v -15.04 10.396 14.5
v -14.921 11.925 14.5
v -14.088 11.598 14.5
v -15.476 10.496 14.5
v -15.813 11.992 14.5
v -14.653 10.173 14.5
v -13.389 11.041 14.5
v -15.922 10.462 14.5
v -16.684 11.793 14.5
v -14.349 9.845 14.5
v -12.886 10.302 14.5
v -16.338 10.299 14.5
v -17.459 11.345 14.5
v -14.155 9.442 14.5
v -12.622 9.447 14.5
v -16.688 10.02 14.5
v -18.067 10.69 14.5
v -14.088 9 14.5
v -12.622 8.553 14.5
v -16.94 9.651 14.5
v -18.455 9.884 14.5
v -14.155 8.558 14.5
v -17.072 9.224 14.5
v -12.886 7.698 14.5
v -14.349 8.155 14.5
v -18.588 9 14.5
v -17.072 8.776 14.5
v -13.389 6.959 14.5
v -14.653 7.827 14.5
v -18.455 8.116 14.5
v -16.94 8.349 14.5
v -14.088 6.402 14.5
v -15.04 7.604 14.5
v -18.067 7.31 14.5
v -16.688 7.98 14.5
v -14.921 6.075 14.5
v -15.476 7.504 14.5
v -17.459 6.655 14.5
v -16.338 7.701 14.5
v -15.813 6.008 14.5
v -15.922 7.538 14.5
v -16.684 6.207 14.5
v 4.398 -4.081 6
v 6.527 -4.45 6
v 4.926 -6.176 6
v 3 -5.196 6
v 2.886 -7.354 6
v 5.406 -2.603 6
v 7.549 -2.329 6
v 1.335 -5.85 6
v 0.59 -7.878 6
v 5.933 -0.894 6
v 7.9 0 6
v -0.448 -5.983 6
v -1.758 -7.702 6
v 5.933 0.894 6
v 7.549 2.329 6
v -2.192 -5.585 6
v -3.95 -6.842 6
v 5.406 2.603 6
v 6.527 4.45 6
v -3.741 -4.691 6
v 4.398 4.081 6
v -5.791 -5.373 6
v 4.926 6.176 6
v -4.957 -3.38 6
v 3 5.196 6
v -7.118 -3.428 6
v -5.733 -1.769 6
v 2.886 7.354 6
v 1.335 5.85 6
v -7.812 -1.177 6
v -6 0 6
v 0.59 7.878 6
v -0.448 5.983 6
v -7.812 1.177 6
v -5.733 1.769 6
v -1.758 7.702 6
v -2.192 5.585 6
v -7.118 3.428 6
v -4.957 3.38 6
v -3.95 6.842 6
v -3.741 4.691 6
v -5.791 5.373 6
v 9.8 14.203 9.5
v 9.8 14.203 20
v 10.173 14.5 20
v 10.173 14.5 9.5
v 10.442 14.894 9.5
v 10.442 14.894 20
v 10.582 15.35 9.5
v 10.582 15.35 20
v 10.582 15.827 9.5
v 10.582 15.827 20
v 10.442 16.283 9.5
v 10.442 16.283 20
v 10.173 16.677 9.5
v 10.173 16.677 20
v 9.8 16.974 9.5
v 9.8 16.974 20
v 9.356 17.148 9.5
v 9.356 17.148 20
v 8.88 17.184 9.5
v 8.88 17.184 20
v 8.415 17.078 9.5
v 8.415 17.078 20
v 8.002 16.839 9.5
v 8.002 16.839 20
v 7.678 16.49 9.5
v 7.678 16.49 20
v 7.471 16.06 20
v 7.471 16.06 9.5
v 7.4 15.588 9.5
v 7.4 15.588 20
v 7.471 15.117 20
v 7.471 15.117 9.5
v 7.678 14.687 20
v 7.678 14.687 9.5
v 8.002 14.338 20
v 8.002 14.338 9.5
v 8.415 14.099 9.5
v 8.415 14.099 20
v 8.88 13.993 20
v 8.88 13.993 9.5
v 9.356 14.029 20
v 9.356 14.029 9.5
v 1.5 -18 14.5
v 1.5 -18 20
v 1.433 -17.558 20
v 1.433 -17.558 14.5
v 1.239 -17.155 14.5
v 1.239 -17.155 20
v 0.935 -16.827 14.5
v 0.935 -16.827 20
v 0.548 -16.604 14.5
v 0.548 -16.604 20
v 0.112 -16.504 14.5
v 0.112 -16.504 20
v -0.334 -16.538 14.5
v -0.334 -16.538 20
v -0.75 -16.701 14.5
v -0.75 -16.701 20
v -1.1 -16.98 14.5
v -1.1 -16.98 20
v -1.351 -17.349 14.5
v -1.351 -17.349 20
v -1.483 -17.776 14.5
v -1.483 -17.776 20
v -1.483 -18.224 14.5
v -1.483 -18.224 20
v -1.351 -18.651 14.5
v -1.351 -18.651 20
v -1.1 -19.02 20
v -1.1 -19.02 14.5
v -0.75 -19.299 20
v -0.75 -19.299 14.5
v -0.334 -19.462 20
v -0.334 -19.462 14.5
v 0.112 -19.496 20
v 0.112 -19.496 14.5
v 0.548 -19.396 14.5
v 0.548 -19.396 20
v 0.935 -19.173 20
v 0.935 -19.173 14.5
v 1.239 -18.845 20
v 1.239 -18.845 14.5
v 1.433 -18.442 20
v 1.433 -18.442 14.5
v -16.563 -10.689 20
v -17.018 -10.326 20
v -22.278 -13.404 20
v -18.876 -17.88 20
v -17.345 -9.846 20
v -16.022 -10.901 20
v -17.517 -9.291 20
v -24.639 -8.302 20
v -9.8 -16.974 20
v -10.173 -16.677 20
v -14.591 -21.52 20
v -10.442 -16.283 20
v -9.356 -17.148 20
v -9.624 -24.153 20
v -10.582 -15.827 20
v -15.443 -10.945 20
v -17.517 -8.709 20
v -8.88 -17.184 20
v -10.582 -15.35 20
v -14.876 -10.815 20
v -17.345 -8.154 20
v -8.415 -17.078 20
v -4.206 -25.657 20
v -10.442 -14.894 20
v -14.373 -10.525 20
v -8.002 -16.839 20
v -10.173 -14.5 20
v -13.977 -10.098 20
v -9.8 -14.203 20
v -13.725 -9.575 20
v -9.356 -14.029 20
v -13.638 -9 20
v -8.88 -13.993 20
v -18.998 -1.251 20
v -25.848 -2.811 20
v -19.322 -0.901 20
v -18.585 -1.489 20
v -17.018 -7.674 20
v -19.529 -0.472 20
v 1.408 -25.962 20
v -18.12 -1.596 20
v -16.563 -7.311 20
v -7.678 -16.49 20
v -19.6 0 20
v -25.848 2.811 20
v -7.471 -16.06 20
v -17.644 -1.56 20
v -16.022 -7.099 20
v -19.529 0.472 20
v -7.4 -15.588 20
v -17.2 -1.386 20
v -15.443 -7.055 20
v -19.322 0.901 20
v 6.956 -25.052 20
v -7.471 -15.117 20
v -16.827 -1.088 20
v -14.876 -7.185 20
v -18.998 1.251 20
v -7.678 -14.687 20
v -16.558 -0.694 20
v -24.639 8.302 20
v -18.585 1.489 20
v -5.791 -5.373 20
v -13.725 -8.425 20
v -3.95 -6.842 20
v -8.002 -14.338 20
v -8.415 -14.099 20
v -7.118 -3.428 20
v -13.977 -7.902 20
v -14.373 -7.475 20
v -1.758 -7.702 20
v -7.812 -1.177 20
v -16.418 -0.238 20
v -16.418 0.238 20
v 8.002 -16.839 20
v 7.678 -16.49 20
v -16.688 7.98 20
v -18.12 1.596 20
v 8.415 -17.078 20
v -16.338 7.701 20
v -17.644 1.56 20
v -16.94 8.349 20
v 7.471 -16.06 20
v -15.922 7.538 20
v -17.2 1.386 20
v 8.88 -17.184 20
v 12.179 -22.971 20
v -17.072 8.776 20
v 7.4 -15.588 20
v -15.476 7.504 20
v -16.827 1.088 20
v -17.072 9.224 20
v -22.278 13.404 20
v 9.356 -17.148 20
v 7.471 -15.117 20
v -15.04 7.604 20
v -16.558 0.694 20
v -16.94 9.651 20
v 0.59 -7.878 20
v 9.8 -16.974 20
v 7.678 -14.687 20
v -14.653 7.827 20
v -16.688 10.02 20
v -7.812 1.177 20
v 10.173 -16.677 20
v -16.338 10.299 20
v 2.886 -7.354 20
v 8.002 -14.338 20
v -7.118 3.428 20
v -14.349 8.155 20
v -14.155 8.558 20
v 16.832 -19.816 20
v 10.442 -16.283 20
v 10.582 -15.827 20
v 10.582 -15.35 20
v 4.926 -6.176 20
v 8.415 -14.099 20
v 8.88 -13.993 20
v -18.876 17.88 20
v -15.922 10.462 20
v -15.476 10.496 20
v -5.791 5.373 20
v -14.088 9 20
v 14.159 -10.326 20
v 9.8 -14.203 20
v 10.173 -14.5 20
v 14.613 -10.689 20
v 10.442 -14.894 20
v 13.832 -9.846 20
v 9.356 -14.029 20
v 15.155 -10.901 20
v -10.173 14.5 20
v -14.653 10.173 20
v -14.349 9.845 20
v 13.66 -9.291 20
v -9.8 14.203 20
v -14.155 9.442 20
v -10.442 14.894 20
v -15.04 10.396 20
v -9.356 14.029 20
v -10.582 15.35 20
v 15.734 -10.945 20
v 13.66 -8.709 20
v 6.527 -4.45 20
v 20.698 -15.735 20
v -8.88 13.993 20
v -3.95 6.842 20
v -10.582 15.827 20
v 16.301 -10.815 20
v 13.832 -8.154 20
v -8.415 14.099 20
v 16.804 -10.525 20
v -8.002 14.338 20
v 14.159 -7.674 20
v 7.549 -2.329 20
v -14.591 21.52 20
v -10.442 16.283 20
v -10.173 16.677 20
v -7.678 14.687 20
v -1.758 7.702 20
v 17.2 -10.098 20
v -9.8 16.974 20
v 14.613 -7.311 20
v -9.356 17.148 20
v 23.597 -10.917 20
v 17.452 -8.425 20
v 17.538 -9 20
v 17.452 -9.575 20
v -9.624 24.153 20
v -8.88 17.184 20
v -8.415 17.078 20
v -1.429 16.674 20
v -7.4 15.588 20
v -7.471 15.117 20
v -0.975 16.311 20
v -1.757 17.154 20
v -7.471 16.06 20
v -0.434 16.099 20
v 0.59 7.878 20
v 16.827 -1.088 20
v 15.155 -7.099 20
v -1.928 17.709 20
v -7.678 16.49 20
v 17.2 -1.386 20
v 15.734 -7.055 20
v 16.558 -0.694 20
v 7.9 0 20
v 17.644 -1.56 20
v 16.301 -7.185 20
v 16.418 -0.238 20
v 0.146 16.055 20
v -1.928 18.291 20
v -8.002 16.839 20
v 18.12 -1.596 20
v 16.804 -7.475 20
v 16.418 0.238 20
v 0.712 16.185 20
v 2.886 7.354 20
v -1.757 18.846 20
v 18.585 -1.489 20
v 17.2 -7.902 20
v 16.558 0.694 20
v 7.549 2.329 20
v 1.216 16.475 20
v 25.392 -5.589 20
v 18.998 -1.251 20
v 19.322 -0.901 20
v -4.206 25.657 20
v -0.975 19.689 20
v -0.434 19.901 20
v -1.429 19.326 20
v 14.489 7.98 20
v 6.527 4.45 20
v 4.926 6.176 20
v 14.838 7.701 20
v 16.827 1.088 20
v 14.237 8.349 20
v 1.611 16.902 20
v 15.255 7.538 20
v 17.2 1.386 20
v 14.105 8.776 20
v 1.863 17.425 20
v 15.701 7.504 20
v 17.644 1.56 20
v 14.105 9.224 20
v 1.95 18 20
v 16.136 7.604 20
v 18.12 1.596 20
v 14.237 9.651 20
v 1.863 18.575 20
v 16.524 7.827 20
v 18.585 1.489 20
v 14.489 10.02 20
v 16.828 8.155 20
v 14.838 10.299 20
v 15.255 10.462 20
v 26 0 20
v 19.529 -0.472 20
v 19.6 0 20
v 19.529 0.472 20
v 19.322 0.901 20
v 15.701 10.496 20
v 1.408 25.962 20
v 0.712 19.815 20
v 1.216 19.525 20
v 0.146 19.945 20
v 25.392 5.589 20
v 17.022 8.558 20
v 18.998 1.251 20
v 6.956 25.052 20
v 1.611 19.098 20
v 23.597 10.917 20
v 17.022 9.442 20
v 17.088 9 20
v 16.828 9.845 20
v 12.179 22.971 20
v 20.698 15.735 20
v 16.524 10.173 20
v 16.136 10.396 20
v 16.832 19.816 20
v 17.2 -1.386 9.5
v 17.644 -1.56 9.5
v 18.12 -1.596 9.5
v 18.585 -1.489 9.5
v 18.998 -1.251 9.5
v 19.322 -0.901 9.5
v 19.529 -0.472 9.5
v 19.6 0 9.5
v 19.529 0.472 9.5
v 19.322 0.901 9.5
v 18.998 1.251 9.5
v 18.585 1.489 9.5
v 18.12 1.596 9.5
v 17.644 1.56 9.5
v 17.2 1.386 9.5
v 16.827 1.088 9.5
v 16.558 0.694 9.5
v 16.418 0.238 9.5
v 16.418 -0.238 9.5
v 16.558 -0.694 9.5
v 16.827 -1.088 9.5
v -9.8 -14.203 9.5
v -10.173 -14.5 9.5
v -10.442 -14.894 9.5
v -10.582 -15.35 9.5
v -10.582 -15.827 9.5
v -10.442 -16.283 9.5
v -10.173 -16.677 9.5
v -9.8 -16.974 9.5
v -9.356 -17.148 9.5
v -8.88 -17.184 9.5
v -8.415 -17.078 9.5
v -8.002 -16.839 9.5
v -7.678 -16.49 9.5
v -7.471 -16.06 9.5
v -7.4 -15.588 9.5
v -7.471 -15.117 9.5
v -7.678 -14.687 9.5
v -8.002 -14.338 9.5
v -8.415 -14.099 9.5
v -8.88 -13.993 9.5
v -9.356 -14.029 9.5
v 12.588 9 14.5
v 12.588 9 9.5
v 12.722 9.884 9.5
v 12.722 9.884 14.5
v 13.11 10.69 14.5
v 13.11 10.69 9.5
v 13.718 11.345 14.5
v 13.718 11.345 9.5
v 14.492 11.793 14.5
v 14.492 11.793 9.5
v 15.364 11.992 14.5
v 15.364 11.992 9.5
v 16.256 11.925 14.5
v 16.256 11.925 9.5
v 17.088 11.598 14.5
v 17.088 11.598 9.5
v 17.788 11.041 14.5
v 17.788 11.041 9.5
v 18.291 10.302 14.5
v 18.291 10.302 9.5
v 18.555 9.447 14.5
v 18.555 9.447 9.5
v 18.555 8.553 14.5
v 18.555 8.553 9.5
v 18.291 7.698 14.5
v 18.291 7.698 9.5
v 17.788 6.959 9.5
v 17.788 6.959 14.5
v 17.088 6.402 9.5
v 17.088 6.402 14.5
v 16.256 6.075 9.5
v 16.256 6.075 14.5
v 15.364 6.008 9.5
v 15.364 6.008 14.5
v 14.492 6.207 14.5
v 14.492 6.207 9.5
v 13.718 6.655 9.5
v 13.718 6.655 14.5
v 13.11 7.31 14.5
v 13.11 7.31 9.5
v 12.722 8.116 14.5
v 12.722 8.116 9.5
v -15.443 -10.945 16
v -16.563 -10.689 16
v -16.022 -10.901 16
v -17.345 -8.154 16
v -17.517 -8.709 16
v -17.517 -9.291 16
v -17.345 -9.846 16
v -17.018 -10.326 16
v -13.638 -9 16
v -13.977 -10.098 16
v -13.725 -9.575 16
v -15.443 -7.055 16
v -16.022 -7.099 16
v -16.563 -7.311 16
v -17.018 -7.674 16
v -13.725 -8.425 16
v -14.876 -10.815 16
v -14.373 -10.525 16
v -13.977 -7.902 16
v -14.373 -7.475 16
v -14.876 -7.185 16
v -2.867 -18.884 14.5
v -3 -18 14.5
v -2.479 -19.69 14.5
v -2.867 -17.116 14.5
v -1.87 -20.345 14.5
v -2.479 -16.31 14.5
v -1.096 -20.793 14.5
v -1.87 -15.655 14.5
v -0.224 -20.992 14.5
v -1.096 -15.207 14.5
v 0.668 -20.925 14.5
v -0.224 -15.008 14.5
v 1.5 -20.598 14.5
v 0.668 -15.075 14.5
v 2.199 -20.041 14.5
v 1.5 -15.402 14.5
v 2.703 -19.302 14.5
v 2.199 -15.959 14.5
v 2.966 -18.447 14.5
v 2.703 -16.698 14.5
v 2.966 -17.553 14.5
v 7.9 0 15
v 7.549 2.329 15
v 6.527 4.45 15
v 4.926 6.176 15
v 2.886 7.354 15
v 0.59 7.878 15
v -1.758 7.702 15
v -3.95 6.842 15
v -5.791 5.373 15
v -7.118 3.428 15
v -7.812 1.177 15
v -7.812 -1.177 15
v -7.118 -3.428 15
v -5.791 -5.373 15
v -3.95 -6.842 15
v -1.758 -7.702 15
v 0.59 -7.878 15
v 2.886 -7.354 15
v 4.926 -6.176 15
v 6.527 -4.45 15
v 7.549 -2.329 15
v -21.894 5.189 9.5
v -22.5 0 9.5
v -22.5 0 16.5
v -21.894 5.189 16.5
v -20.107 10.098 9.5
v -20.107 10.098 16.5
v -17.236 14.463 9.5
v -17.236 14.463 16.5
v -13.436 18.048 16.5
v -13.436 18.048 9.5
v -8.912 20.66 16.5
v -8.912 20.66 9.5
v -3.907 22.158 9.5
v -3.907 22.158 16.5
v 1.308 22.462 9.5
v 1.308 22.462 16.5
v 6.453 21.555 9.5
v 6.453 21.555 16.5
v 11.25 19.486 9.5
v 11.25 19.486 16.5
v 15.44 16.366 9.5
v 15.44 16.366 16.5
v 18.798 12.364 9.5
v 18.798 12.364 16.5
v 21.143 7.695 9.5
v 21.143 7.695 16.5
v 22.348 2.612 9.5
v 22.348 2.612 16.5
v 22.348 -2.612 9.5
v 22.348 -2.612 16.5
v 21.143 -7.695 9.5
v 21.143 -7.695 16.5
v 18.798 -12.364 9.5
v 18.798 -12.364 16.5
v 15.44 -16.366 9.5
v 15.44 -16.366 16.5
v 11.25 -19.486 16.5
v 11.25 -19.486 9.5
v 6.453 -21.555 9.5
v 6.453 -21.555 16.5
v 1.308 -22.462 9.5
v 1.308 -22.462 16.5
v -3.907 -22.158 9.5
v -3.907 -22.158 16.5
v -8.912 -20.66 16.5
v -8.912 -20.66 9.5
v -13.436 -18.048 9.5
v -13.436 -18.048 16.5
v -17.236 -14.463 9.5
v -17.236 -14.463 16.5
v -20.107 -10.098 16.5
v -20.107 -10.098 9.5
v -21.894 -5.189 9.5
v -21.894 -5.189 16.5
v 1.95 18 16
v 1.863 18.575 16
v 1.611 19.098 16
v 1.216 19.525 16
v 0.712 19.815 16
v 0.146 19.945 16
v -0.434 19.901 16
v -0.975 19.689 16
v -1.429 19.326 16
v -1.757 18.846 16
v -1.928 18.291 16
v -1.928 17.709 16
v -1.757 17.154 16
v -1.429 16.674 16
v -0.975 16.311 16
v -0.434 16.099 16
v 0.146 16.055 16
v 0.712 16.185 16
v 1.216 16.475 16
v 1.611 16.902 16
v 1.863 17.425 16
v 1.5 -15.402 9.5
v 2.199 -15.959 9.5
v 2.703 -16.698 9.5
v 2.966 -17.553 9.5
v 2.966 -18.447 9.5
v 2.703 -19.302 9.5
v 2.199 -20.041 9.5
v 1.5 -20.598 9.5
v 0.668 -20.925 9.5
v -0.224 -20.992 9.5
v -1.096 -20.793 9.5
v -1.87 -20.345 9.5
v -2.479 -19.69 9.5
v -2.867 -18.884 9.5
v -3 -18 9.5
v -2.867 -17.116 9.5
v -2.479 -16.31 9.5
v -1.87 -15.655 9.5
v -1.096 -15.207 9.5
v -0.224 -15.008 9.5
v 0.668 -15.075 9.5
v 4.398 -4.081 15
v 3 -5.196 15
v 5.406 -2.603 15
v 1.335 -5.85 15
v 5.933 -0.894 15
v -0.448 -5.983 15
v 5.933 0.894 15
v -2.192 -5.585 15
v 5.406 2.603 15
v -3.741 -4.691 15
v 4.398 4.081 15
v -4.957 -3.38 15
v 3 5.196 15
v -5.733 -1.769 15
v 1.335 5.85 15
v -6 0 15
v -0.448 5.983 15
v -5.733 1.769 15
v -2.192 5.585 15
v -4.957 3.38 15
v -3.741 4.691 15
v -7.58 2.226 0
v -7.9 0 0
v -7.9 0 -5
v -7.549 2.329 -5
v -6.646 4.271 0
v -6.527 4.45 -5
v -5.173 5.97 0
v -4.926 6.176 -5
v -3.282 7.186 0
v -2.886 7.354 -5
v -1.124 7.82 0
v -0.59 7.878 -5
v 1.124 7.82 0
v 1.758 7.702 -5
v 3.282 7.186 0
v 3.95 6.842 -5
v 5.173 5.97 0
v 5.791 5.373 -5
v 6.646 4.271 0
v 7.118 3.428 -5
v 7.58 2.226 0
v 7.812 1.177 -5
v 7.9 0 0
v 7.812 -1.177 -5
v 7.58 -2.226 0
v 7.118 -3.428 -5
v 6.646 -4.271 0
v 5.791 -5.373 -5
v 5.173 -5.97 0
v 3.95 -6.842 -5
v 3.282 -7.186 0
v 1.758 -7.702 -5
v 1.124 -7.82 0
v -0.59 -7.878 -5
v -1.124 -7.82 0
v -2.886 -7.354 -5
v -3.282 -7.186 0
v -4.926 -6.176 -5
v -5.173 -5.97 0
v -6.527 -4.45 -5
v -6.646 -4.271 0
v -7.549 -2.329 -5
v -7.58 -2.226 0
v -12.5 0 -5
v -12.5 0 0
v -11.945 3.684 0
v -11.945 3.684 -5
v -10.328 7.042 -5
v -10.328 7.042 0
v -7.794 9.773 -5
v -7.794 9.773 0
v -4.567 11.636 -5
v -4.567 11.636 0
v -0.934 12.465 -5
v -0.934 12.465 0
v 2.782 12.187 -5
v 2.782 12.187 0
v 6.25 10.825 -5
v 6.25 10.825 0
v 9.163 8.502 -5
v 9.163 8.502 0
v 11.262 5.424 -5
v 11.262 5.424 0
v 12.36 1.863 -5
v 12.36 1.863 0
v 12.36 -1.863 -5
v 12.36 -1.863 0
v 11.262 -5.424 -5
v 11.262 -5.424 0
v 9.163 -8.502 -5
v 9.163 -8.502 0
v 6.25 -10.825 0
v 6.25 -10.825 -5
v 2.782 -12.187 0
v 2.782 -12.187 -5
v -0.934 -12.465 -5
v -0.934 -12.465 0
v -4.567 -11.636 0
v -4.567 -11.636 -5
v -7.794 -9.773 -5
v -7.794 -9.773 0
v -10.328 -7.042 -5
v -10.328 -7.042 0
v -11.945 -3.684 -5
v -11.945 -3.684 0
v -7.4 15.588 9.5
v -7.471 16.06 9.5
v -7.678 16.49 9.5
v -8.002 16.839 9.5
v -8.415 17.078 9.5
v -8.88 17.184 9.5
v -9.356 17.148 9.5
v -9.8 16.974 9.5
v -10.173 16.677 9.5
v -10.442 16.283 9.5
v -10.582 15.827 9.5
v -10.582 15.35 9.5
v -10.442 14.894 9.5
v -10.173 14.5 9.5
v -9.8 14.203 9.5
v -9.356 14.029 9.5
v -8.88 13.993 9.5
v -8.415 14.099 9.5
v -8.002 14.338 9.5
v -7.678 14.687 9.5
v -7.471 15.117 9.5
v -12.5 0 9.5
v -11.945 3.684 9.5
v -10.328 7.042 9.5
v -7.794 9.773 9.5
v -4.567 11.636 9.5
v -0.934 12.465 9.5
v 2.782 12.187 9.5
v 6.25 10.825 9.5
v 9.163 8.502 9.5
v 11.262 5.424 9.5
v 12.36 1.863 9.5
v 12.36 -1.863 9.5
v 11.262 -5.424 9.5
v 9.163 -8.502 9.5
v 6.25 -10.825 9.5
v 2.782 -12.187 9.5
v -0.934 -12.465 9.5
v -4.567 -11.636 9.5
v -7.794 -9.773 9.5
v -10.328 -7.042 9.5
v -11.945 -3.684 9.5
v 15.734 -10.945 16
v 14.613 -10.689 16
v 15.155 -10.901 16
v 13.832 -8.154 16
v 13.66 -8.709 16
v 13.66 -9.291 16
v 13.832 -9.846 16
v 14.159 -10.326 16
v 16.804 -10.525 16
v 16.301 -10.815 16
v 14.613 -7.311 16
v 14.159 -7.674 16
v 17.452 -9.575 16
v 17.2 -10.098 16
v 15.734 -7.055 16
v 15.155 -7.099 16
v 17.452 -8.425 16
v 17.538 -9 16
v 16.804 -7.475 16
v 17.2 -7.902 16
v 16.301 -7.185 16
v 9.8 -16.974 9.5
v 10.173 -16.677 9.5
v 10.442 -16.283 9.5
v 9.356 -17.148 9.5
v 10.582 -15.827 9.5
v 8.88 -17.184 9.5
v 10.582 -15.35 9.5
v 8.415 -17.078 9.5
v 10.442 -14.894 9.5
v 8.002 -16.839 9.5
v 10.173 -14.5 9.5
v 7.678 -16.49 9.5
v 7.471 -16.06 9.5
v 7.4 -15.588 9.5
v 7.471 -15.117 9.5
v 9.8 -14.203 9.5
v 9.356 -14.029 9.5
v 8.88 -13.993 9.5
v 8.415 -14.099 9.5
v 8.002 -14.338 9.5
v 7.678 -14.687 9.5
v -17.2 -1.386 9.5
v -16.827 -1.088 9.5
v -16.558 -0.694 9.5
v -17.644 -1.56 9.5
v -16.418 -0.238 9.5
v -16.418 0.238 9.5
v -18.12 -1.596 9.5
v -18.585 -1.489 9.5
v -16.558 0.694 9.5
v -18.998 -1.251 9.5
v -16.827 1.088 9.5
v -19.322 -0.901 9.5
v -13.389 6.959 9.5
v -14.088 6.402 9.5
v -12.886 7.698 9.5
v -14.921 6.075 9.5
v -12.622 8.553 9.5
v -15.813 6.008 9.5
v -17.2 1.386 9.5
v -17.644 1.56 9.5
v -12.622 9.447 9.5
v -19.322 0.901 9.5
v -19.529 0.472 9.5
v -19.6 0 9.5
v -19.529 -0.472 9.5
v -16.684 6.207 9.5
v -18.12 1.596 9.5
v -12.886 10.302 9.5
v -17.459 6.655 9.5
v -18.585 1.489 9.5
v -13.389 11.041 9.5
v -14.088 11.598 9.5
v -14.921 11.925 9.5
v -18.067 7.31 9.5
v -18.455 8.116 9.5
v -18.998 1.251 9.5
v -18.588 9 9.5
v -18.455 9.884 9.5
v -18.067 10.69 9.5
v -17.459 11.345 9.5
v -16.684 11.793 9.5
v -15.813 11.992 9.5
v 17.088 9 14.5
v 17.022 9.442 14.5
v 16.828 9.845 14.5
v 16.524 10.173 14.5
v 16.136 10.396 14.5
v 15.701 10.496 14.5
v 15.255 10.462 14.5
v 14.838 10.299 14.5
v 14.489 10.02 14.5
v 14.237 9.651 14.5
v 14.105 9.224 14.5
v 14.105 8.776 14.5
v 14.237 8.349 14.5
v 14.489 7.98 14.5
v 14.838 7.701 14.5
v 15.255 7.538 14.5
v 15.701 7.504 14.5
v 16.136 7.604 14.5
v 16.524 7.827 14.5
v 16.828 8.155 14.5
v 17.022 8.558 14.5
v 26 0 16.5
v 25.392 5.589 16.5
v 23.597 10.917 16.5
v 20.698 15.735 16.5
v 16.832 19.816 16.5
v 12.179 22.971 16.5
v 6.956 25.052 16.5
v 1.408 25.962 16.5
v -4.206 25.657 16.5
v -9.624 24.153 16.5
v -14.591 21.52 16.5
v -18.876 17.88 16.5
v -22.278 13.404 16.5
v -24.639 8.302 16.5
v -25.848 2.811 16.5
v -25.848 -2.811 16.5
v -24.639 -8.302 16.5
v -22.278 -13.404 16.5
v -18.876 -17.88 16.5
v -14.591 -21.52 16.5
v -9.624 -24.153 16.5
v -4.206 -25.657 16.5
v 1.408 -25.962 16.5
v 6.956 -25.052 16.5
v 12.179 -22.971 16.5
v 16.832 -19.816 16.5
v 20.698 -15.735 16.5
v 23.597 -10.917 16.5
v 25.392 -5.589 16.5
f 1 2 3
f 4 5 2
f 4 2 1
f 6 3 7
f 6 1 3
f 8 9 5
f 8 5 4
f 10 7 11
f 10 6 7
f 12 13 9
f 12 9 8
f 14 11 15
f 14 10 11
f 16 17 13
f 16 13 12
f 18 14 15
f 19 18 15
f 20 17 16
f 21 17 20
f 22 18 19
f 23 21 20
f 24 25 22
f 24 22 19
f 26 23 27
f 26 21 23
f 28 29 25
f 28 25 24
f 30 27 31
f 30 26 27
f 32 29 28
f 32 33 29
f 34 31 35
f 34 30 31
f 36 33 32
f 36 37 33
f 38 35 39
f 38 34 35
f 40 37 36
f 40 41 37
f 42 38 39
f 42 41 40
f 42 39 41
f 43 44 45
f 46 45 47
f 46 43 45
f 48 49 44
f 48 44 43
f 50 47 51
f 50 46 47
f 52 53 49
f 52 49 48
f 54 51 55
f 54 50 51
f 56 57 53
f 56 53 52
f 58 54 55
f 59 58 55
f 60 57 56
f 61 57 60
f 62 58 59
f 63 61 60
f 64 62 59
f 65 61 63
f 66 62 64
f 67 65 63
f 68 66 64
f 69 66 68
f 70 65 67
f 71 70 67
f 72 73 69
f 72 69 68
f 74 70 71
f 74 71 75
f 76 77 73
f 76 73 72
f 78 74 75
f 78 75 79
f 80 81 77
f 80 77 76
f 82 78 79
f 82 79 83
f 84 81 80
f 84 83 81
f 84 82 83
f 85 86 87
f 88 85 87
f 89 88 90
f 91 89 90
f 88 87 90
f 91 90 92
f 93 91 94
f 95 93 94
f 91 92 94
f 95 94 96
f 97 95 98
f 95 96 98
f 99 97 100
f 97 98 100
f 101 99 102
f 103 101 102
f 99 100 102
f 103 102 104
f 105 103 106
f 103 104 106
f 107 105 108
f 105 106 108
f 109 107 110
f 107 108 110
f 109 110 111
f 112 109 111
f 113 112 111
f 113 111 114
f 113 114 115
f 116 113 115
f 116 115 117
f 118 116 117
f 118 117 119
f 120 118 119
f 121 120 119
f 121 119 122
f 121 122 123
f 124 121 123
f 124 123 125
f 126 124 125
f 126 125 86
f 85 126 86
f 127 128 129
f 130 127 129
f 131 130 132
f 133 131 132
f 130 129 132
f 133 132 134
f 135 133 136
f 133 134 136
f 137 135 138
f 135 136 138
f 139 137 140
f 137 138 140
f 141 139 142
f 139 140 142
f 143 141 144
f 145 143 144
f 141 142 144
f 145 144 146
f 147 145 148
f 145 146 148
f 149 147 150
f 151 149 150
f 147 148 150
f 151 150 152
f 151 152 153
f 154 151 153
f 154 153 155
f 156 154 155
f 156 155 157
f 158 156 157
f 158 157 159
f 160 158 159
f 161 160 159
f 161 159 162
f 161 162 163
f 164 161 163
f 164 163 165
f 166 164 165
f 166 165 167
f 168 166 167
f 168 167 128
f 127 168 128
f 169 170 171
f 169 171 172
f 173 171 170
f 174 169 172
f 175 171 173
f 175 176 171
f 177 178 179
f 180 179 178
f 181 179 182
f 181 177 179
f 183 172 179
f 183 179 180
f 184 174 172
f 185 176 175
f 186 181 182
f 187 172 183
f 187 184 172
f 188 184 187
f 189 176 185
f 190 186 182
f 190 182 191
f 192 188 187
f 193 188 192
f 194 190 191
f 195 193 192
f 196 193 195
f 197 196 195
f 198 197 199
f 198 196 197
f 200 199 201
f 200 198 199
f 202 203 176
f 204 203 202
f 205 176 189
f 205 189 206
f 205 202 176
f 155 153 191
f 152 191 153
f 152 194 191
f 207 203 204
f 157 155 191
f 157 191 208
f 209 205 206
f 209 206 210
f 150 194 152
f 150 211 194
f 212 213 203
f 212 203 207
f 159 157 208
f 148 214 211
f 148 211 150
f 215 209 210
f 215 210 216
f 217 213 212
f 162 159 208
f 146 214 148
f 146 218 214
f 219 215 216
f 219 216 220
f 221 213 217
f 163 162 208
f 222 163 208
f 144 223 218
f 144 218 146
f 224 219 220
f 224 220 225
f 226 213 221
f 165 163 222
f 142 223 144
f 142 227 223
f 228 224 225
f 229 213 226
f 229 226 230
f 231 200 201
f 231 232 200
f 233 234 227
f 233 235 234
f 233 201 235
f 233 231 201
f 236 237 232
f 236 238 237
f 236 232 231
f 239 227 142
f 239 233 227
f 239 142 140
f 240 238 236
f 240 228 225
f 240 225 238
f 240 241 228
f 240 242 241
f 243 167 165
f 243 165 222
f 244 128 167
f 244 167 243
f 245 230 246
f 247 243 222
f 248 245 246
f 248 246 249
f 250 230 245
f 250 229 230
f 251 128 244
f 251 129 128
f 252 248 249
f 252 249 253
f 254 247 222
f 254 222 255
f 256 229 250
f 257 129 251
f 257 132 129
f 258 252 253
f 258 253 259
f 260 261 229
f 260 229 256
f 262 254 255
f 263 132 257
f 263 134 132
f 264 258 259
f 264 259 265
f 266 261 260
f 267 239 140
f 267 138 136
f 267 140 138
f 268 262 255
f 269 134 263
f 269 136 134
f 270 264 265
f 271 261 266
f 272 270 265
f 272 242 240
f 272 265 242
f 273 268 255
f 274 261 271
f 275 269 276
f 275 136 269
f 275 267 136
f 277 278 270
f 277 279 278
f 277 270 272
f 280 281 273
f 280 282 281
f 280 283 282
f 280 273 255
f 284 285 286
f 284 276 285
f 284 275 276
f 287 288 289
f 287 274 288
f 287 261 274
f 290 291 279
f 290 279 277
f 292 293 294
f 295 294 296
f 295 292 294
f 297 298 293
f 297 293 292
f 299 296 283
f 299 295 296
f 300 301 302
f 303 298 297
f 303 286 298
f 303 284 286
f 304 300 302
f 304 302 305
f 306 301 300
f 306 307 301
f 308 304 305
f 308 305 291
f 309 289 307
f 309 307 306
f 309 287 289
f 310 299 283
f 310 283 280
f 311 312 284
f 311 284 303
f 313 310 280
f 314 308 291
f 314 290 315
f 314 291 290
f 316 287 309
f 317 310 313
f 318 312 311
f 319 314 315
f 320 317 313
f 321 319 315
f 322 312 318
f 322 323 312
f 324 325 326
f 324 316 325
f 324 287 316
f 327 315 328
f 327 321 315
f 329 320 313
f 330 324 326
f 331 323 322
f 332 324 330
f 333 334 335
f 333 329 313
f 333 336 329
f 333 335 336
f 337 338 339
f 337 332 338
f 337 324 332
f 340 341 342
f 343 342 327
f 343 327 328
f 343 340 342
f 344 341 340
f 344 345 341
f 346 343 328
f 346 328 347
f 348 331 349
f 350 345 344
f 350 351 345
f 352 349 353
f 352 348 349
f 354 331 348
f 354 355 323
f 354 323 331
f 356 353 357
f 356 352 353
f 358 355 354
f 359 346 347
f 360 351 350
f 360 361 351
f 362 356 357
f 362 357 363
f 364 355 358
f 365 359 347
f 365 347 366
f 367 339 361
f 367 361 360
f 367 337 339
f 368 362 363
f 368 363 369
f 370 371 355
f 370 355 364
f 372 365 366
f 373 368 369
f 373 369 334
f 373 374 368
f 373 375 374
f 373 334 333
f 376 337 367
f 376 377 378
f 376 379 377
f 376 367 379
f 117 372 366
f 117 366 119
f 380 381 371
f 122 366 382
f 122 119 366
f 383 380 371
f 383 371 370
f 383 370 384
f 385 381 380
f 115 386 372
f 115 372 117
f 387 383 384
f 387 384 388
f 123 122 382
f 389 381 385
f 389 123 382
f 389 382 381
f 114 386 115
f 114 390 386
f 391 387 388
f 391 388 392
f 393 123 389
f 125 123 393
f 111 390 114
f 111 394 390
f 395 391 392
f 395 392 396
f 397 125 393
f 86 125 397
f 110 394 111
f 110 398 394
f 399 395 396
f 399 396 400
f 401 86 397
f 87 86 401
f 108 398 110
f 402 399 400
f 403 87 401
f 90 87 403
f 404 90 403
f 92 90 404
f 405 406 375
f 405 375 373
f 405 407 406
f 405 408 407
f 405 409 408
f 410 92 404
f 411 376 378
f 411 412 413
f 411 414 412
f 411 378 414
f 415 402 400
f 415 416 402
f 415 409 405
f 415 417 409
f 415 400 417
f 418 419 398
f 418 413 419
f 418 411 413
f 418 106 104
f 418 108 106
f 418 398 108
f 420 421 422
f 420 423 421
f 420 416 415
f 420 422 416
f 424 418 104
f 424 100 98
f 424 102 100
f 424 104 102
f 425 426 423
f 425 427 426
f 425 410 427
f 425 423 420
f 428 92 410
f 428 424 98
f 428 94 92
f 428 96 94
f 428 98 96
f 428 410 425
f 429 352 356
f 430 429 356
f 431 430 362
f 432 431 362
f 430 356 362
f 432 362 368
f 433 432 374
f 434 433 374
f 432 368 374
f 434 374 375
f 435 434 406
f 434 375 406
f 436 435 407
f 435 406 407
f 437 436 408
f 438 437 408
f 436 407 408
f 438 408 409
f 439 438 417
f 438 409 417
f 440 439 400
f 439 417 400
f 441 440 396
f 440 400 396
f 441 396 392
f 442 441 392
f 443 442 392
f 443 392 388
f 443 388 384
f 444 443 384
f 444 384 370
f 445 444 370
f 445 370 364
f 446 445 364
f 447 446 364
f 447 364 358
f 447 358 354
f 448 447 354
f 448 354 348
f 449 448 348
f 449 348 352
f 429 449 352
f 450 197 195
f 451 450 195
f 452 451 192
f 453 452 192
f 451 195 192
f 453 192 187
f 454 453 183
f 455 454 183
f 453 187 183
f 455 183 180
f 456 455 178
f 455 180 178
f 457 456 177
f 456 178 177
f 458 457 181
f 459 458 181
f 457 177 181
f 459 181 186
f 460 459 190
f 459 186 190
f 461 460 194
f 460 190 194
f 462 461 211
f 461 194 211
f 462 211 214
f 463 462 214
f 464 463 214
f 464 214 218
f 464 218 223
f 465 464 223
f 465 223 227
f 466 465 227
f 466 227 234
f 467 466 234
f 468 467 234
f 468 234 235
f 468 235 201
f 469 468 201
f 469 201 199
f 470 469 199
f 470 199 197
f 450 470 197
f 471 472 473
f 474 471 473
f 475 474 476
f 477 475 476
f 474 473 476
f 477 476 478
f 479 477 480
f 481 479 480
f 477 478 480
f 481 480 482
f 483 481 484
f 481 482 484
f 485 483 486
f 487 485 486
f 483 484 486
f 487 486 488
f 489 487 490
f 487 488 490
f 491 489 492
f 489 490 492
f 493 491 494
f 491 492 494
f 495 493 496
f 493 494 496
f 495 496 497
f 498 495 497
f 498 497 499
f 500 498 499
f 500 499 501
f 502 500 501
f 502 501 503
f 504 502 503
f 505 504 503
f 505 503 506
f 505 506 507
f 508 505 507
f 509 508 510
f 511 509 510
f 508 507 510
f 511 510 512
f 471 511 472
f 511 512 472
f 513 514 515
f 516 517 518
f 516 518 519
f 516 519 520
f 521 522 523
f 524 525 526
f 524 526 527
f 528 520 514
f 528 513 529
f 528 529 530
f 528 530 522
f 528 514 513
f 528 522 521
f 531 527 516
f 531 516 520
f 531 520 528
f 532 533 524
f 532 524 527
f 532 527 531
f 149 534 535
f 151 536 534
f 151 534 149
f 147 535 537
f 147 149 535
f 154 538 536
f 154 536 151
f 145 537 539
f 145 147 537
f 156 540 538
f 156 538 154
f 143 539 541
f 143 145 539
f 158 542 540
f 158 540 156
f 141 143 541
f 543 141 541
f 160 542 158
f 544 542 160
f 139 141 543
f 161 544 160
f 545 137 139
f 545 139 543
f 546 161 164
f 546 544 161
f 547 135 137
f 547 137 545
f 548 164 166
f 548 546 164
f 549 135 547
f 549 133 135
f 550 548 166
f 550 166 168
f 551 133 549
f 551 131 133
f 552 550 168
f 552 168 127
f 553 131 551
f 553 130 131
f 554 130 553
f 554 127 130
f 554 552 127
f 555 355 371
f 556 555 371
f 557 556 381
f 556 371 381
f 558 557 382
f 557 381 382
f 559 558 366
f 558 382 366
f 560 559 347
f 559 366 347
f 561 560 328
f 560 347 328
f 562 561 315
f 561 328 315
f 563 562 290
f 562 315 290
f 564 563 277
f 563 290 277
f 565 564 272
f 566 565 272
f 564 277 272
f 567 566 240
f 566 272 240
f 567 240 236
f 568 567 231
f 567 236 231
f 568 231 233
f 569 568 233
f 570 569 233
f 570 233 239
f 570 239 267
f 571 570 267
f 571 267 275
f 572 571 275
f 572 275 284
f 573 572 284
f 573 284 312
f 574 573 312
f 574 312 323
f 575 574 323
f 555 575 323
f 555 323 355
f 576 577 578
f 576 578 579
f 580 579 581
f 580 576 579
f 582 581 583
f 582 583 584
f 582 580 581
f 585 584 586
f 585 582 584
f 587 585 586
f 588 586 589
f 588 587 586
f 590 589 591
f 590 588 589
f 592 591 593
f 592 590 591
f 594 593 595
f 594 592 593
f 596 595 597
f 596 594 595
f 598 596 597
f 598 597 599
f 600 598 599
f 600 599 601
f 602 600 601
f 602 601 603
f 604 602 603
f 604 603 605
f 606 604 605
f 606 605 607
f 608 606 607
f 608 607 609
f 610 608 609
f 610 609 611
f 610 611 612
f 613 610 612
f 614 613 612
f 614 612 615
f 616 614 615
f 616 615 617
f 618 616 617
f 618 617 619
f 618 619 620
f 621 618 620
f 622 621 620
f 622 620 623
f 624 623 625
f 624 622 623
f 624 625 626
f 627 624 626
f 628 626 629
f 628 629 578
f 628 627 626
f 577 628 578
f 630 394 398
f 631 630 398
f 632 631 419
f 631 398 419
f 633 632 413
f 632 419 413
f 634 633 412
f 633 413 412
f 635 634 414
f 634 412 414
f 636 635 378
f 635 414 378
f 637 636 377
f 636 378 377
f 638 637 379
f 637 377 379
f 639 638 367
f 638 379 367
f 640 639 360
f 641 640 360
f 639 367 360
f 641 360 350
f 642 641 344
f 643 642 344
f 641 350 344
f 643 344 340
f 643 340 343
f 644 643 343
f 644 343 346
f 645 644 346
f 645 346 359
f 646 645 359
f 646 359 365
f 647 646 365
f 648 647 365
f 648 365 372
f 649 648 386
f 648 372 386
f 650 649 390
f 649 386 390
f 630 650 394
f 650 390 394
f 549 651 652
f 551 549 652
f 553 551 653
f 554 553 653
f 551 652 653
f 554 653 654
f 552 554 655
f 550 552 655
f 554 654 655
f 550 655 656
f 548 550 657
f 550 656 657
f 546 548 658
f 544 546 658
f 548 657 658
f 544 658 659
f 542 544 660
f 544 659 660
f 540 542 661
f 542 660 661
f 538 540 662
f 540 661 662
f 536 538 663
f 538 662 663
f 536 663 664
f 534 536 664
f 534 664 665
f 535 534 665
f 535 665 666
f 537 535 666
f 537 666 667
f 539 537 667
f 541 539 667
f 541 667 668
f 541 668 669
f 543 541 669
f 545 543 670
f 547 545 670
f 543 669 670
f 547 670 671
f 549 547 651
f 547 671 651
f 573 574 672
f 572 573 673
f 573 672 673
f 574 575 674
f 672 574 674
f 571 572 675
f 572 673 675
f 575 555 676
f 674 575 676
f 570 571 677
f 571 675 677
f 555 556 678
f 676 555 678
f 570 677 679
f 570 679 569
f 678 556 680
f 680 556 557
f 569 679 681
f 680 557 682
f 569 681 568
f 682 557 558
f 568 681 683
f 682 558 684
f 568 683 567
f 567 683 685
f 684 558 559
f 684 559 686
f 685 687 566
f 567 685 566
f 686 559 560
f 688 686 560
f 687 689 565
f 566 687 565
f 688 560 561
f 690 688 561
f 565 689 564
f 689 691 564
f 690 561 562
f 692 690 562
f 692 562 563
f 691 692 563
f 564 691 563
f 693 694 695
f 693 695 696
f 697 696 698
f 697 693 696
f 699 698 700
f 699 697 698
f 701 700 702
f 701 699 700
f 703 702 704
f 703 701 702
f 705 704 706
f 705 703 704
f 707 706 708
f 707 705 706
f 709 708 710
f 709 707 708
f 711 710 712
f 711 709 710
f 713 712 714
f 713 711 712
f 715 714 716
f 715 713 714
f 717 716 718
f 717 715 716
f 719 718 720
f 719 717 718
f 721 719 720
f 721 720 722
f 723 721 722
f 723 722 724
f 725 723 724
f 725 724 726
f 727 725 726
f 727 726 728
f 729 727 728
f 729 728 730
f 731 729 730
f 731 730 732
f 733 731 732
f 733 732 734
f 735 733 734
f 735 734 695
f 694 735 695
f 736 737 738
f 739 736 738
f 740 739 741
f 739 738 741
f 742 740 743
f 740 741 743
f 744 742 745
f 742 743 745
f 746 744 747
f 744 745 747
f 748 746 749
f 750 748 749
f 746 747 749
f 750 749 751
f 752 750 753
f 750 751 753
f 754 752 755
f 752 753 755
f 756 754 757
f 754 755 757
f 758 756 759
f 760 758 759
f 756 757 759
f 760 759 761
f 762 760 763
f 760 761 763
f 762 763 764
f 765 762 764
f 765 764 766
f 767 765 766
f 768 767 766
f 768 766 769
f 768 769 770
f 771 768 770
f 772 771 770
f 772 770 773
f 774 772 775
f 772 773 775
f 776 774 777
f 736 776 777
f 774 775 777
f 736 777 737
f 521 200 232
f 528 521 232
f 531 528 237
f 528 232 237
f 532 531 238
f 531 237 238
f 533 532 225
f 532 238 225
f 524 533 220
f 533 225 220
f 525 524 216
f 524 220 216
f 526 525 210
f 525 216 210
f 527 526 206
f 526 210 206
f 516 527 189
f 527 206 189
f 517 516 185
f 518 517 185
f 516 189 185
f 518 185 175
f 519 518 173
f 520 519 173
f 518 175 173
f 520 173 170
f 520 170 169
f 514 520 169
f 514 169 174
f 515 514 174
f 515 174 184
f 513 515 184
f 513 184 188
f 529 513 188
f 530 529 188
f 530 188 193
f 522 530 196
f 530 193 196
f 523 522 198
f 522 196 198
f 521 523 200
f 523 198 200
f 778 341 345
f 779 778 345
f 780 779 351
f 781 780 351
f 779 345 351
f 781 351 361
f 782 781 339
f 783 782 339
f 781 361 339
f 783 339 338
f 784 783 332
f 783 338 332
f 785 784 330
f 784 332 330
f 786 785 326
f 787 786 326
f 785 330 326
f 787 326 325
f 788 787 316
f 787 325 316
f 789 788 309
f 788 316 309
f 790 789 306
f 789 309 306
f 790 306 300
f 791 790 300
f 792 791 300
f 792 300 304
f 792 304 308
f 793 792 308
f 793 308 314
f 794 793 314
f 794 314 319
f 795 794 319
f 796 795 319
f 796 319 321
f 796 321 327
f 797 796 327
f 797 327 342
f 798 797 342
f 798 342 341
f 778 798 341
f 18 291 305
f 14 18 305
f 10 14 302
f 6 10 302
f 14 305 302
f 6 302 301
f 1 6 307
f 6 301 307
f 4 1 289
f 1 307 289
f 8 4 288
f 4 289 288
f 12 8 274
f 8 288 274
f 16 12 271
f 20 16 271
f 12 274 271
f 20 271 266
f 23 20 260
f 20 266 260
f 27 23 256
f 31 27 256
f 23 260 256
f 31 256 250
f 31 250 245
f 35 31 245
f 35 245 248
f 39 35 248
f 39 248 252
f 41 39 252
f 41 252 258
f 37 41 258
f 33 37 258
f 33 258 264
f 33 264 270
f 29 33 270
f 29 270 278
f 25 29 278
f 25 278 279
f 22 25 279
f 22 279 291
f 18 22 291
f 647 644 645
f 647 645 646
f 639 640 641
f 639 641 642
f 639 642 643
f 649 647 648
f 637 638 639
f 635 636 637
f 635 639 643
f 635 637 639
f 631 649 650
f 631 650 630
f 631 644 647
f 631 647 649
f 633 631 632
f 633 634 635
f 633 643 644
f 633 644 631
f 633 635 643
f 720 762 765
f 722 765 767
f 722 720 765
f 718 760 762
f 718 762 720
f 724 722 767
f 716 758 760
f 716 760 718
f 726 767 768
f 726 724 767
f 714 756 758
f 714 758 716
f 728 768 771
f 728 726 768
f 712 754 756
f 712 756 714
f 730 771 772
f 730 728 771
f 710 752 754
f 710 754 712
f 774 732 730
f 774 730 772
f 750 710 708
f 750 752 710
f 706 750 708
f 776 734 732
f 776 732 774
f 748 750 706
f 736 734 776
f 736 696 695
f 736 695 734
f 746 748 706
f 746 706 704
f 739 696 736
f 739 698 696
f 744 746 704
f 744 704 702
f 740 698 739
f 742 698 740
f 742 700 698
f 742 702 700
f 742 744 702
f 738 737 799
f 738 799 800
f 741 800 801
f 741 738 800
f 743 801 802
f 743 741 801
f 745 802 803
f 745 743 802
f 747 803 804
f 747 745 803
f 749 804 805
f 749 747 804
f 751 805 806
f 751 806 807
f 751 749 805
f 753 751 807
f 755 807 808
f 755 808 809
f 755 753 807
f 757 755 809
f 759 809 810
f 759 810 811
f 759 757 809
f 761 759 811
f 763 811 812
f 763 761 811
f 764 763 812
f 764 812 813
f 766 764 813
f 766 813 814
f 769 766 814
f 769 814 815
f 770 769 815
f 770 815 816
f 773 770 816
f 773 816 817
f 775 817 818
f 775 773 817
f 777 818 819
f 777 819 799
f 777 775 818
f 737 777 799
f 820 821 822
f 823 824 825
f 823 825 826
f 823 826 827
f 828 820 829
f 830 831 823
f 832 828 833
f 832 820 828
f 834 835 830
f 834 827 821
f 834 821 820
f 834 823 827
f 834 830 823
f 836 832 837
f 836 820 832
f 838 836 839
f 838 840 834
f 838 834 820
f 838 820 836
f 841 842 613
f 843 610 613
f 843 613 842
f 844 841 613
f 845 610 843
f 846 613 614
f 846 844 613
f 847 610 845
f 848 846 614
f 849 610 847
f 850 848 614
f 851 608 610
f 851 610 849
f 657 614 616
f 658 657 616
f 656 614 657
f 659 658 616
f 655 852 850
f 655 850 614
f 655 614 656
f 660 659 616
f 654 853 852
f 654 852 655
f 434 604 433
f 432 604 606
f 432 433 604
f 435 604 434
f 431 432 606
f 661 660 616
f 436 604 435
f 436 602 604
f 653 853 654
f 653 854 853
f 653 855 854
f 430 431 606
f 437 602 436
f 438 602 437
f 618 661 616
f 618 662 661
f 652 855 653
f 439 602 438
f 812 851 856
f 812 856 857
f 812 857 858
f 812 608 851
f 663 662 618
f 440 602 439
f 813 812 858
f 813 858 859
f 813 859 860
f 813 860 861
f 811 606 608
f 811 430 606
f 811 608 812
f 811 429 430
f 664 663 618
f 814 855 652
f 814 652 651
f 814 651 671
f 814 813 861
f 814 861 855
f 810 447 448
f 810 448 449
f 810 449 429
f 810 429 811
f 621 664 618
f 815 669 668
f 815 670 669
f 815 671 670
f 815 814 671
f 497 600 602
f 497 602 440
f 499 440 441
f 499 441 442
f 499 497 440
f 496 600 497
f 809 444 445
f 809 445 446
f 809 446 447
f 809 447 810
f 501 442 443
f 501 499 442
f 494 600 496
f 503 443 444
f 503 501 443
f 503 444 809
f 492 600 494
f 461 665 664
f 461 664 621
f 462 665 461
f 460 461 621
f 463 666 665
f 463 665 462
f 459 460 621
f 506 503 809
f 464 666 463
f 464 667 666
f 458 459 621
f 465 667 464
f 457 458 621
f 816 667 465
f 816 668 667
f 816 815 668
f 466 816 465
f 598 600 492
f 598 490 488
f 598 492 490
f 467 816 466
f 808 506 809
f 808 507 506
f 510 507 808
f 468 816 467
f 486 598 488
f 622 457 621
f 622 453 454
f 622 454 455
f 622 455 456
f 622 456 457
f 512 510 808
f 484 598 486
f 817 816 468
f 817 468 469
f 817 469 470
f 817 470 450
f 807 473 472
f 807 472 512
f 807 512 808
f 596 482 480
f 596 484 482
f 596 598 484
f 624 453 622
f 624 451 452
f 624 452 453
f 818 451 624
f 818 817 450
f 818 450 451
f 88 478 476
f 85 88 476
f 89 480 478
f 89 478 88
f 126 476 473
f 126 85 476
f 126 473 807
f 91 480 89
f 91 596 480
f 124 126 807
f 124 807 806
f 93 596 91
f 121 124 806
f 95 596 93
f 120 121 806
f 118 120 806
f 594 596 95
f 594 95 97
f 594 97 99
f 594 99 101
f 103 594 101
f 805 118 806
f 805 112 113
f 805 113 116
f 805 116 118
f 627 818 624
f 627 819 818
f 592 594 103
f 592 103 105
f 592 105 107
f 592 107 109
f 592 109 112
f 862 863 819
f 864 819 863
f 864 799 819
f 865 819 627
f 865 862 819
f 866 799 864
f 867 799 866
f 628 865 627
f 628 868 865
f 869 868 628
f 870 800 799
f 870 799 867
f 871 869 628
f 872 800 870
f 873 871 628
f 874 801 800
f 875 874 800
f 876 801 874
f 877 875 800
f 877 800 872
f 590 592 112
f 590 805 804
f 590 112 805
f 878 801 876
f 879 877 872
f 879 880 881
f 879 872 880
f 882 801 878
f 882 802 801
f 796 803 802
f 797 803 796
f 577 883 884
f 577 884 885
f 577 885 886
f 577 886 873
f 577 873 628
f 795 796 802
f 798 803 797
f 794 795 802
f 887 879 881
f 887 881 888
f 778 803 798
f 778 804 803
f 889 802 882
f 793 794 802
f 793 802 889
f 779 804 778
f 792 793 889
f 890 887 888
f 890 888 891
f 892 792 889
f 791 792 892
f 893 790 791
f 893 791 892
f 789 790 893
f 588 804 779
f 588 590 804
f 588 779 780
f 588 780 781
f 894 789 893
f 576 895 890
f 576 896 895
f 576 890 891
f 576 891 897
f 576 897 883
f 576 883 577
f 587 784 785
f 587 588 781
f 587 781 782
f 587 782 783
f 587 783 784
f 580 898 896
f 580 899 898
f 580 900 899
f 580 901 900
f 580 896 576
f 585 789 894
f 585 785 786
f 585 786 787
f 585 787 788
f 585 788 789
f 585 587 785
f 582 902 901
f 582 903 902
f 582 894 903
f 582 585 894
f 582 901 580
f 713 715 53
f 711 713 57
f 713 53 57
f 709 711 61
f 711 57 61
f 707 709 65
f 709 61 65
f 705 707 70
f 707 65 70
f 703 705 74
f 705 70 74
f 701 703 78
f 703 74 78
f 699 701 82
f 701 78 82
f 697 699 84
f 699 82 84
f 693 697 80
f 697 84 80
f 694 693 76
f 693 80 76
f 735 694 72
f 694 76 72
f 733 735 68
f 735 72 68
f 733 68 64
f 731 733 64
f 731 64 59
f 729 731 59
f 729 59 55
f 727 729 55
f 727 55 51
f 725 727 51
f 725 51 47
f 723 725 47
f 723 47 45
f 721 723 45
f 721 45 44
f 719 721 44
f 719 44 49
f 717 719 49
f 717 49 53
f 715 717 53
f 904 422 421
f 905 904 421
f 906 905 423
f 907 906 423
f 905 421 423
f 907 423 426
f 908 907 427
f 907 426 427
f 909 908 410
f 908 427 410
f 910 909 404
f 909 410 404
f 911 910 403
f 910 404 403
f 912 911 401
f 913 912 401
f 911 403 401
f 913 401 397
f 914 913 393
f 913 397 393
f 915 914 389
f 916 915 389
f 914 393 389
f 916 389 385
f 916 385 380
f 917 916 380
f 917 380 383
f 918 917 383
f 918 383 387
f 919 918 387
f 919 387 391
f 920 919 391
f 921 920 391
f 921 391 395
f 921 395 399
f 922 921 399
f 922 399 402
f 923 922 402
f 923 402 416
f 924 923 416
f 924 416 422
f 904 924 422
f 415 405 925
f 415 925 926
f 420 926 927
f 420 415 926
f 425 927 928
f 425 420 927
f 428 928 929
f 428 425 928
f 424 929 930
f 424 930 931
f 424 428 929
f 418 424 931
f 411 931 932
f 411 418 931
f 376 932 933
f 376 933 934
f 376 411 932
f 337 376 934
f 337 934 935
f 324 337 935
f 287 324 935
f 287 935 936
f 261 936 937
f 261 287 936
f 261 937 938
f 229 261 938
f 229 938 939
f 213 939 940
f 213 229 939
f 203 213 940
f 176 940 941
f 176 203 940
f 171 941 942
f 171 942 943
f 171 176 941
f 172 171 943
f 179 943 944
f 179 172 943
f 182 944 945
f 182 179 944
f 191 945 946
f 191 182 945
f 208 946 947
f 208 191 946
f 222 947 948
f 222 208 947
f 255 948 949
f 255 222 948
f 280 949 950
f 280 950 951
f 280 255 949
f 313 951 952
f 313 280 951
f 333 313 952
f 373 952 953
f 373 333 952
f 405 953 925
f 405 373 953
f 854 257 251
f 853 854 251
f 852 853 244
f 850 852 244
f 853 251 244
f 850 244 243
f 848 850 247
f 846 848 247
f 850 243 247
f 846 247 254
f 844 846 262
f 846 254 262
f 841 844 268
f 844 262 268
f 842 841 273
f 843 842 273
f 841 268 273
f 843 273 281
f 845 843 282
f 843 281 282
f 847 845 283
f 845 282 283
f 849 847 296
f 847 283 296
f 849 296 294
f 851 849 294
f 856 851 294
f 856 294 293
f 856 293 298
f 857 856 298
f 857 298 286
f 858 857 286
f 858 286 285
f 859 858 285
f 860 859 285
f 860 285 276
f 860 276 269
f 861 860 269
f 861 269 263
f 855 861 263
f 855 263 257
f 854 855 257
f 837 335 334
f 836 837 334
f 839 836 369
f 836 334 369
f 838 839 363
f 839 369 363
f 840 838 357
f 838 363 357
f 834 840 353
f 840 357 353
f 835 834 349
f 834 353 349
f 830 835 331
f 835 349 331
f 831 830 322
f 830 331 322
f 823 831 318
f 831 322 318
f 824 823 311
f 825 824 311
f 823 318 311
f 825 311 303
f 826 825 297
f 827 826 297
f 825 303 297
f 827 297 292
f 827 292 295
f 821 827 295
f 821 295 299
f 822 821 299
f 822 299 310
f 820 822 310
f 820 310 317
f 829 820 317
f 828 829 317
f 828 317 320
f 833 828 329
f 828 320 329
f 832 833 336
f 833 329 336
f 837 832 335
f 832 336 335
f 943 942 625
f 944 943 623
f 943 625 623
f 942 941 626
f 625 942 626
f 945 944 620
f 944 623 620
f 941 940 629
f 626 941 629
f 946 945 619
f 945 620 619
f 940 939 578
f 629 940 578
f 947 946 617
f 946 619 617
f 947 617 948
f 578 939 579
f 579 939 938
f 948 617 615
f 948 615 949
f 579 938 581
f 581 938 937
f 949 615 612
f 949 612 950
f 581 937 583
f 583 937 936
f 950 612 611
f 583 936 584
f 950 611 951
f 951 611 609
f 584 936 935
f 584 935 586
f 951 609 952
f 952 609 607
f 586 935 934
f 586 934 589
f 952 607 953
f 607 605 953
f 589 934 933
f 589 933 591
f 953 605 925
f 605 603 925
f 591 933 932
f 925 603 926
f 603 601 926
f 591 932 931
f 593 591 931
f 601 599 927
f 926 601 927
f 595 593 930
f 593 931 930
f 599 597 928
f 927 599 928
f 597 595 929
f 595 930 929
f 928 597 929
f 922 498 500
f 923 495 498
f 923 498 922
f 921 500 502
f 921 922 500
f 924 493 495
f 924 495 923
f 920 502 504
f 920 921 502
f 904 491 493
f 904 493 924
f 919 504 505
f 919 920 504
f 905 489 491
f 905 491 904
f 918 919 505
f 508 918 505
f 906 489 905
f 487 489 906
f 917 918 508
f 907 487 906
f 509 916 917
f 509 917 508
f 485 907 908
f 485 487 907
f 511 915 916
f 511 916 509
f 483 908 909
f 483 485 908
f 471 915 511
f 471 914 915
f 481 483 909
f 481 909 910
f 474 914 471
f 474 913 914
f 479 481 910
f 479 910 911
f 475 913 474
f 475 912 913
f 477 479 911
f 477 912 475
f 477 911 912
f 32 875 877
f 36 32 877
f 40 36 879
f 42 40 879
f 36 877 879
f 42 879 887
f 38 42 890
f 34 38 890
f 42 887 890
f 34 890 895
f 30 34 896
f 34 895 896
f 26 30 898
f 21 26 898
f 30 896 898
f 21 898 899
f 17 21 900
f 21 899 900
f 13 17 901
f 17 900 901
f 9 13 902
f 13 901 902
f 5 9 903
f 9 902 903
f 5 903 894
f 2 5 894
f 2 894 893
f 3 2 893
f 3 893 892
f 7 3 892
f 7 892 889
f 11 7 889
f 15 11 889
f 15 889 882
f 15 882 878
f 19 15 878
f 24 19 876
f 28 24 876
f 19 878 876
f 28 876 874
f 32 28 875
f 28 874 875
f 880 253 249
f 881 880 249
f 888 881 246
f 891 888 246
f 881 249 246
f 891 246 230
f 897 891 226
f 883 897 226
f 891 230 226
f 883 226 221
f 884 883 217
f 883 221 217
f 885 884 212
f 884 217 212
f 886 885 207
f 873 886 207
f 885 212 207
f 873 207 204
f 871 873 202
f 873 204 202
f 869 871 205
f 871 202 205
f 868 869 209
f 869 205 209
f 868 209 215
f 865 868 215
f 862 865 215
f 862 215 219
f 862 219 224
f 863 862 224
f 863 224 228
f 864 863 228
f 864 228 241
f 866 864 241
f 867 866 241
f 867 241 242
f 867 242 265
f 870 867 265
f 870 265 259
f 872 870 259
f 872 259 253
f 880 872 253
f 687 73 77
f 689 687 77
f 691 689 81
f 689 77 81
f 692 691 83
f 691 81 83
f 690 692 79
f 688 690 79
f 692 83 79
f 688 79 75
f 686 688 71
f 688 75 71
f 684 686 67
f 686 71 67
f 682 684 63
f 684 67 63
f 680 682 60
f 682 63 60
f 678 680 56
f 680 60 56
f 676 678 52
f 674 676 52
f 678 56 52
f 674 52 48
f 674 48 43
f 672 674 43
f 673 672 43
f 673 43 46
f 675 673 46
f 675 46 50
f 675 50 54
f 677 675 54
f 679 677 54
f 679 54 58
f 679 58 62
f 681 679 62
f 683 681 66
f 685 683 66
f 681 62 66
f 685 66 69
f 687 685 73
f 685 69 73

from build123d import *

# Parameters (mm, degrees)
SKETCH1_R           = 25
BOSS_EXTRUDE1_DEPTH = 20
SKETCH2_R           = 1.95
CUT_EXTRUDE1_DEPTH  = 4
SKETCH4_R           = 1.5
CUT_EXTRUDE2_DEPTH  = 21
SKETCH6_R           = 7.9
CUT_EXTRUDE3_DEPTH  = 21
BOSS_EXTRUDE4_START = -6
SKETCH7_R           = 7.9
SKETCH7_R_2         = 6
BOSS_EXTRUDE4_DEPTH = 9
SKETCH9_R           = 26
SKETCH9_R_2         = 25
BOSS_EXTRUDE6_DEPTH = 3.5
SKETCH10_R          = 25
SKETCH10_R_2        = 22.5
CUT_EXTRUDE5_DEPTH  = 16.5
SKETCH11_R          = 22.5
SKETCH11_R_2        = 12.5
CUT_EXTRUDE6_DEPTH  = 9.5
SKETCH12_R          = 3
CUT_EXTRUDE7_DEPTH  = 5
CIRPATTERN2_COUNT   = 3
SKETCH13_R          = 1.6
CUT_EXTRUDE8_DEPTH  = 21
CIRPATTERN3_COUNT   = 6
SKETCH15_R          = 12.5
SKETCH15_R_2        = 7.9
BOSS_EXTRUDE7_DEPTH = 5


with BuildPart() as part:
    # Sketch1 → Boss-Extrude1 (new body)
    with BuildSketch(Plane.XY):
        Circle(SKETCH1_R)
    extrude(amount=BOSS_EXTRUDE1_DEPTH)

    # Sketch2 → Cut-Extrude1 (cut)
    with BuildSketch(Plane.XY.offset(20)):
        with Locations((0, 18)):
            Circle(SKETCH2_R)
        with Locations((15.588457268, -9)):
            Circle(SKETCH2_R)
        with Locations((-15.588457268, -9)):
            Circle(SKETCH2_R)
    extrude(amount=-CUT_EXTRUDE1_DEPTH, mode=Mode.SUBTRACT)

    # Sketch4 → Cut-Extrude2 (cut, through all)
    with BuildSketch(Plane.XY.offset(20)):
        with Locations((15.588457268, 9)):
            Circle(SKETCH4_R)
        with Locations((0, -18)):
            Circle(SKETCH4_R)
        with Locations((-15.588457268, 9)):
            Circle(SKETCH4_R)
    extrude(amount=-CUT_EXTRUDE2_DEPTH, mode=Mode.SUBTRACT)

    # Sketch6 → Cut-Extrude3 (cut, through all)
    with BuildSketch(Plane.XY.offset(20)):
        Circle(SKETCH6_R)
    extrude(amount=-CUT_EXTRUDE3_DEPTH, mode=Mode.SUBTRACT)

    # Sketch7 → Boss-Extrude4 (add)
    with BuildSketch(Plane(origin=(0, 0, 0), x_dir=(-1, 0, 0), z_dir=(0, 0, -1)).offset(BOSS_EXTRUDE4_START)):
        Circle(SKETCH7_R)
        Circle(SKETCH7_R_2, mode=Mode.SUBTRACT)
    extrude(amount=-BOSS_EXTRUDE4_DEPTH)

    # Sketch9 → Boss-Extrude6 (add)
    with BuildSketch(Plane.XY.offset(20)):
        Circle(SKETCH9_R)
        Circle(SKETCH9_R_2, mode=Mode.SUBTRACT)
    extrude(amount=-BOSS_EXTRUDE6_DEPTH)

    # Sketch10 → Cut-Extrude5 (cut)
    with BuildSketch(Plane(origin=(0, 0, 0), x_dir=(-1, 0, 0), z_dir=(0, 0, -1))):
        Circle(SKETCH10_R)
        Circle(SKETCH10_R_2, mode=Mode.SUBTRACT)
    extrude(amount=-CUT_EXTRUDE5_DEPTH, mode=Mode.SUBTRACT)

    # Sketch11 → Cut-Extrude6 (cut)
    with BuildSketch(Plane(origin=(0, 0, 0), x_dir=(-1, 0, 0), z_dir=(0, 0, -1))):
        Circle(SKETCH11_R)
        Circle(SKETCH11_R_2, mode=Mode.SUBTRACT)
    extrude(amount=-CUT_EXTRUDE6_DEPTH, mode=Mode.SUBTRACT)

    # Sketch12 → Cut-Extrude7 (cut)
    with BuildSketch(Plane(origin=(0, 0, 9.5), x_dir=(-1, 0, 0), z_dir=(0, 0, -1))):
        with Locations((-15.588457268, 9)):
            Circle(SKETCH12_R)
    cut_extrude7 = extrude(amount=-CUT_EXTRUDE7_DEPTH, mode=Mode.SUBTRACT)

    # CirPattern2: Cut-Extrude7 ×3 about axis
    cirpattern2_axis = Axis((0, 0, 0), (0, 0, 1))
    for i in range(1, CIRPATTERN2_COUNT):
        add(cut_extrude7.rotate(cirpattern2_axis, i * 360 / CIRPATTERN2_COUNT), mode=Mode.SUBTRACT)

    # Sketch13 → Cut-Extrude8 (cut, through all)
    with BuildSketch(Plane.XY.offset(20)):
        with Locations((-9, 15.588457268)):
            Circle(SKETCH13_R)
    cut_extrude8 = extrude(amount=-CUT_EXTRUDE8_DEPTH, mode=Mode.SUBTRACT)

    # CirPattern3: Cut-Extrude8 ×6 about axis
    cirpattern3_axis = Axis((0, 0, 0), (0, 0, 1))
    for i in range(1, CIRPATTERN3_COUNT):
        add(cut_extrude8.rotate(cirpattern3_axis, i * 360 / CIRPATTERN3_COUNT), mode=Mode.SUBTRACT)

    # Sketch15 → Boss-Extrude7 (add)
    with BuildSketch(Plane(origin=(0, 0, 0), x_dir=(-1, 0, 0), z_dir=(0, 0, -1))):
        Circle(SKETCH15_R)
        Circle(SKETCH15_R_2, mode=Mode.SUBTRACT)
    extrude(amount=BOSS_EXTRUDE7_DEPTH)


solid = part.part
